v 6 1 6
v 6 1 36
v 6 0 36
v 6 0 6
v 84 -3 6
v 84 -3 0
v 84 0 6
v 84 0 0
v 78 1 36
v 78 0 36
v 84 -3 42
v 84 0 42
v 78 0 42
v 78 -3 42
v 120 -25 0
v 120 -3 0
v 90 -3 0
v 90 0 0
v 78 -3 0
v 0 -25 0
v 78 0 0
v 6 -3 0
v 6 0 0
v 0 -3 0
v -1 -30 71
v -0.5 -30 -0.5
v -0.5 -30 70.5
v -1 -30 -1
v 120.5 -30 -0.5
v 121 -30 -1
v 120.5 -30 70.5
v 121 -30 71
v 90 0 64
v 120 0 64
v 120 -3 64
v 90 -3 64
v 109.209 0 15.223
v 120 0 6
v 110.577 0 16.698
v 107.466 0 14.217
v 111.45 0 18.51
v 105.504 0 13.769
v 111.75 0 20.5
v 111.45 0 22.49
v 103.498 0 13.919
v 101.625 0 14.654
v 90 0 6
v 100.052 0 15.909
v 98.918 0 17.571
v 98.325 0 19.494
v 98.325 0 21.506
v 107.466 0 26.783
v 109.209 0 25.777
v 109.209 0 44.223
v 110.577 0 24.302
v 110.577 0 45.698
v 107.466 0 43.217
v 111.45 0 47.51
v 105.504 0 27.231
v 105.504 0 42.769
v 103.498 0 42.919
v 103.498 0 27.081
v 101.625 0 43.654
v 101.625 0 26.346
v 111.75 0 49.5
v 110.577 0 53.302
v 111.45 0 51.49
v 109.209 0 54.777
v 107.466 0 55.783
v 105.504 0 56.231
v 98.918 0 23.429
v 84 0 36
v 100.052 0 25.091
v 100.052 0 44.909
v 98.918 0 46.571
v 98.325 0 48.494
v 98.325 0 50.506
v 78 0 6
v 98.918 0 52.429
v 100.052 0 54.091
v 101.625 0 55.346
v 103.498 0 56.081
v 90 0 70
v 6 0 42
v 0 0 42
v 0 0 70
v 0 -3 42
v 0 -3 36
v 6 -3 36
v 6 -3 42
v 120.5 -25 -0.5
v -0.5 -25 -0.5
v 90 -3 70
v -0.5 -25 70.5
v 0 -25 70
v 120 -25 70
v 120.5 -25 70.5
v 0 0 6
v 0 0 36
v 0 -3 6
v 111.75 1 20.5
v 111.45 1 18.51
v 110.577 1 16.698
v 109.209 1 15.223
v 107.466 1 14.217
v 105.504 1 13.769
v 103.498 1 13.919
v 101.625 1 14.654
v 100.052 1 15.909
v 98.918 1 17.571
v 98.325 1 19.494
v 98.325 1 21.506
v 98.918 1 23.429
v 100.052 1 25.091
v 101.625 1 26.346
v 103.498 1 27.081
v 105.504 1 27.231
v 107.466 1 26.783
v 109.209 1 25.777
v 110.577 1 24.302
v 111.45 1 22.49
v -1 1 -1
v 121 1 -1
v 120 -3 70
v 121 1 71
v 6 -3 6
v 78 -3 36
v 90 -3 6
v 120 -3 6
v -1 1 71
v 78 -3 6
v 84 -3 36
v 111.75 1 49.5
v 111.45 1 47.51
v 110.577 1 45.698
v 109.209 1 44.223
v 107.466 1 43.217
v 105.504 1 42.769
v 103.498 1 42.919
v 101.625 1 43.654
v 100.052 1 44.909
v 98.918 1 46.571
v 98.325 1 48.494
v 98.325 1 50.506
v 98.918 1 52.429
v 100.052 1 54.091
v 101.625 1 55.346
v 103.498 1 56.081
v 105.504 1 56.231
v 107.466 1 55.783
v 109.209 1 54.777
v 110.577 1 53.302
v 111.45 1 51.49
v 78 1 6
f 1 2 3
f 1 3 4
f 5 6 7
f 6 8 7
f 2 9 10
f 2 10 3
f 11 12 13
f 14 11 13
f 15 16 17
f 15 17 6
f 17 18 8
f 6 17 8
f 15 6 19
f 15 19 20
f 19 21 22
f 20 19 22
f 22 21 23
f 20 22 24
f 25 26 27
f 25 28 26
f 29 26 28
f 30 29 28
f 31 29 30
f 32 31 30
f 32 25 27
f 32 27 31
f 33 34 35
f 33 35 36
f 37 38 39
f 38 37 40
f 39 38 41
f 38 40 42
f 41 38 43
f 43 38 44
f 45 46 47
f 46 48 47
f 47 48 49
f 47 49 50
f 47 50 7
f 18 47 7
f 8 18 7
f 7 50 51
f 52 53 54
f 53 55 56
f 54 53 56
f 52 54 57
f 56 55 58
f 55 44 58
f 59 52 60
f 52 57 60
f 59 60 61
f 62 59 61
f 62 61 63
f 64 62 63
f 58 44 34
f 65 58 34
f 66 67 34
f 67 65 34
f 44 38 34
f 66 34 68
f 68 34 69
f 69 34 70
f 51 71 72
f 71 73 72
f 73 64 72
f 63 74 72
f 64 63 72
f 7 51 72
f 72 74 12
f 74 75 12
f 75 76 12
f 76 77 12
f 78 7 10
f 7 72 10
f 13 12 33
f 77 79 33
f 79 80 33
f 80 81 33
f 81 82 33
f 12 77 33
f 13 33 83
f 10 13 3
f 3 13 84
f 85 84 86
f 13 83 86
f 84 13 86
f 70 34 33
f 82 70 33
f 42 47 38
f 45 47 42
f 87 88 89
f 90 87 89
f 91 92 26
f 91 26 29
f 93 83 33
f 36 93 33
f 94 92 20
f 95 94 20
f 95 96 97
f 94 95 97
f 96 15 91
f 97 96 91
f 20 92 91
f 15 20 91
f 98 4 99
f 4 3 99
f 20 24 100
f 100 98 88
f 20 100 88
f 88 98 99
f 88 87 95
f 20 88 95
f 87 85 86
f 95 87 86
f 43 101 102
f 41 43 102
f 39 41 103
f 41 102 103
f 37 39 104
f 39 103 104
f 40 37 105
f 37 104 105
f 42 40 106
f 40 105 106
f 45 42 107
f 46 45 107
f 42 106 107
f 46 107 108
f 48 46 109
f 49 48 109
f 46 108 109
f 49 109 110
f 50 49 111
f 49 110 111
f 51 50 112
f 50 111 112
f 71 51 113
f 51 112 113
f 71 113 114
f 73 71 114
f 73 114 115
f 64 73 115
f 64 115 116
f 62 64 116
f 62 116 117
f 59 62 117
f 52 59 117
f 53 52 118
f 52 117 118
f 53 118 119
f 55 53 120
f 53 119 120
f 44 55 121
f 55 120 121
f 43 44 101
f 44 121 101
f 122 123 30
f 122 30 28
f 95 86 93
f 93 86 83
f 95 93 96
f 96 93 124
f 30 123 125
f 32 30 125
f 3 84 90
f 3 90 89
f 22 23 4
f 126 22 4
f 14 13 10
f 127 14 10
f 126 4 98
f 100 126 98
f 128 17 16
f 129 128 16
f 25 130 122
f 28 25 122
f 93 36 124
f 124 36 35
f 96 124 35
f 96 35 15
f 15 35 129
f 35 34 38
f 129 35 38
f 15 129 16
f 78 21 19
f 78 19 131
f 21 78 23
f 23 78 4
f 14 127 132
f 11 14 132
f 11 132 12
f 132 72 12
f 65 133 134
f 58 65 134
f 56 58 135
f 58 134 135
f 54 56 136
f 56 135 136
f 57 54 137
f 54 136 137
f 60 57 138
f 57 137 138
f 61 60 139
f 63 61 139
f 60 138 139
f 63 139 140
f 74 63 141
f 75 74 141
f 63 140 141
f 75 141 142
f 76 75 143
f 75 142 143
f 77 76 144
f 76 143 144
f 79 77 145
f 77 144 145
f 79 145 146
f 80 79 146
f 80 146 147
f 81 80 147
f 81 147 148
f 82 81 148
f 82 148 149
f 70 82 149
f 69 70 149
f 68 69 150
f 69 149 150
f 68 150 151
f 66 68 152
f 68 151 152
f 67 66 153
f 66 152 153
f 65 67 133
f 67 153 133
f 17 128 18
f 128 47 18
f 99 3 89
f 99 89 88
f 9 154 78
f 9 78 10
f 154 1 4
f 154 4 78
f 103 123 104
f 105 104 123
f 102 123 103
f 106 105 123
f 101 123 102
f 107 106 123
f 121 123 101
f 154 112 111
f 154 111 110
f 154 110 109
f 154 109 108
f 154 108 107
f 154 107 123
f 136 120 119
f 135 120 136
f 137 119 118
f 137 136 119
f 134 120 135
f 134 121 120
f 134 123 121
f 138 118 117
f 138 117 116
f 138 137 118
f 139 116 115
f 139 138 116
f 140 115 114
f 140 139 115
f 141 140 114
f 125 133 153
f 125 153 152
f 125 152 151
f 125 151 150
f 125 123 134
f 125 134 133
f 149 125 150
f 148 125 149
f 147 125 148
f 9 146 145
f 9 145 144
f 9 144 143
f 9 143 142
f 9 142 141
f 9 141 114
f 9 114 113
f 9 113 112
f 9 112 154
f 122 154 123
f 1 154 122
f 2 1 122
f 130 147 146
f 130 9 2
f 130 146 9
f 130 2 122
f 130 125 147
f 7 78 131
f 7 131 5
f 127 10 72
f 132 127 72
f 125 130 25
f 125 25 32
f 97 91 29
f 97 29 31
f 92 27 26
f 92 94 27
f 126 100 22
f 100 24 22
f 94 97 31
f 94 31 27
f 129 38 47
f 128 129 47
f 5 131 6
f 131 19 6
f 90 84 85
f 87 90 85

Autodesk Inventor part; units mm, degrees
ref_plane "YZ Plane" through (0, 0, 0) normal (1, 0, 0) x (0, 1, 0)
ref_plane "XZ Plane" through (0, 0, 0) normal (0, 1, 0) x (-1, 0, 0)
ref_plane "XY Plane" through (0, 0, 0) normal (0, 0, 1) x (1, 0, 0)
sketch "Sketch1" plane through (0, 0, 0) normal (0, 1, 0) x (-1, 0, 0)
  line L0 (0, 0) -> (-120, 0)
  line L1 (-120, 0) -> (-120, 70)
  line L2 (-120, 70) -> (0, 70)
  line L3 (0, 70) -> (0, 0)
  dimension "d0" = 120
  dimension "d1" = 70
extrude "Extrusion1" add sketch "Sketch1" along normal blind 1
sketch "Sketch2" plane through (0, 1, 0) normal (0, 1, 0) x (1, 0, 0)
  line L0 (120, -70) -> (120, 0) projected
  line L1 (120, 0) -> (0, 0) projected
  line L2 (120, -70) -> (90, -70)
  line L3 (90, -70) -> (90, 0)
  line L4 (90, 0) -> (120, 0)
  line L5 (120, 0) -> (120, -70)
  line L6 (0, 0) -> (0, -70) projected
  line L7 (0, -70) -> (90, -70)
  line L8 (90, -70) -> (90, -11)
  line L9 (90, -11) -> (0, -11)
  line L10 (0, -11) -> (0, -70)
  line L11 (0, 0) -> (84, 0)
  line L12 (84, 0) -> (84, -42)
  line L13 (84, -42) -> (0, -42)
  line L14 (0, -42) -> (0, 0)
  line L15 (0, 0) -> (6, 0)
  line L16 (6, 0) -> (6, -6)
  line L17 (6, -6) -> (0, -6)
  line L18 (0, -6) -> (0, 0)
  line L19 (84, 0) -> (78, 0)
  line L20 (78, 0) -> (78, -6)
  line L21 (78, -6) -> (84, -6)
  line L22 (84, -6) -> (84, 0)
  line L23 (90, 0) -> (120, 0)
  line L24 (120, 0) -> (120, -6)
  line L25 (120, -6) -> (90, -6)
  line L26 (90, -6) -> (90, 0)
  line L27 (0, -42) -> (6, -42)
  line L28 (6, -42) -> (6, -36)
  line L29 (6, -36) -> (0, -36)
  line L30 (0, -36) -> (0, -42)
  line L31 (84, -42) -> (78, -42)
  line L32 (78, -42) -> (78, -36)
  line L33 (78, -36) -> (84, -36)
  line L34 (84, -36) -> (84, -42)
  line L35 (90, -70) -> (120, -70)
  line L36 (120, -70) -> (120, -64)
  line L37 (120, -64) -> (90, -64)
  line L38 (90, -64) -> (90, -70)
  line L39 (6, -6) -> (78, -6)
  line L40 (78, -6) -> (78, -36)
  line L41 (78, -36) -> (6, -36)
  line L42 (6, -36) -> (6, -6)
  line L43 (90, 0) -> (105, 0)
  line L44 (105, 0) -> (105, -20.5)
  line L45 (105, -20.5) -> (90, -20.5)
  line L46 (90, -20.5) -> (90, 0)
  circle A0 centre (105, -20.5) radius 6.75
  line L47 (90, -70) -> (105, -70)
  line L48 (105, -70) -> (105, -49.5)
  line L49 (105, -49.5) -> (90, -49.5)
  line L50 (90, -49.5) -> (90, -70)
  circle A1 centre (105, -49.5) radius 6.75
  point P0 (90, -64)
  point P1 (90, -6)
  point P2 (120, -6)
  point P3 (78, 0)
  point P4 (0, -36)
  point P5 (0, -42)
  point P6 (6, -11)
  point P7 (6, -36)
  point P8 (79, -29)
  point P9 (78, -11)
  dimension "d4" = 30
  dimension "d5" = 59
  dimension "d6" = 84
  dimension "d7" = 42
  dimension "d8" = 6
  dimension "d9" = 6
  dimension "d10" = 6
  dimension "d11" = 6
  dimension "d12" = 6
  dimension "d13" = 6
  dimension "d14" = 30
  dimension "d15" = 15
  dimension "d16" = 20.5
  dimension "d17" = 13.5
  dimension "d18" = 15
  dimension "d19" = 20.5
  dimension "d20" = 13.5
extrude "Extrusion2" cut sketch "Sketch2" against normal blind 1 contours A1 L49 L48 | L48 L49 A1 | A0 L45 L44 | L44 L45 A0
extrude "Extrusion3" add sketch "Sketch2" against normal blind 4 contours L2 L48 L37 L0 | L2 L3 L37 L48 | L25 L44 L1 L0 | L25 L3 L1 L44 | L6 L29 L28 L13 | L12 L21 L20 L1 | L32 L33 L12 L13 | L6 L1 L16 L17
extrude "Extrusion4" cut sketch "Sketch2" against normal blind 4 contours L42 L9 L40 L41 | L9 L42 L39 L40
sketch "Sketch5" plane through (0, 1, 0) normal (0, 1, 0) x (1, 0, 0)
  line L0 (0, 0) -> (0, -70) projected
  line L1 (0, 0) -> (-1, 0)
  line L2 (-1, 0) -> (-1, 1)
  line L3 (-1, 1) -> (0, 1)
  line L4 (0, 1) -> (0, 0)
  line L5 (0, -70) -> (-1, -70)
  line L6 (-1, -70) -> (-1, -71)
  line L7 (-1, -71) -> (0, -71)
  line L8 (0, -71) -> (0, -70)
  line L9 (0, -70) -> (120, -70) projected
  line L10 (120, -70) -> (121, -70)
  line L11 (121, -70) -> (121, -71)
  line L12 (121, -71) -> (120, -71)
  line L13 (120, -71) -> (120, -70)
  line L14 (120, -70) -> (120, 0) projected
  line L15 (120, 0) -> (121, 0)
  line L16 (121, 0) -> (121, 1)
  line L17 (121, 1) -> (120, 1)
  line L18 (120, 1) -> (120, 0)
  line L19 (120, 0) -> (0, 0) projected
  line L20 (120, 1) -> (0, 1)
  line L21 (0, 1) -> (0, 0)
  line L22 (0, 0) -> (120, 0)
  line L23 (120, 0) -> (120, 1)
  line L24 (-1, 0) -> (0, 0)
  line L25 (0, 0) -> (0, -70)
  line L26 (0, -70) -> (-1, -70)
  line L27 (-1, -70) -> (-1, 0)
  line L28 (0, -71) -> (120, -71)
  line L29 (120, -71) -> (120, -70)
  line L30 (120, -70) -> (0, -70)
  line L31 (0, -70) -> (0, -71)
  line L32 (121, -70) -> (120, -70)
  line L33 (120, -70) -> (120, 0)
  line L34 (120, 0) -> (121, 0)
  line L35 (121, 0) -> (121, -70)
  dimension "d36" = 1
  dimension "d37" = 1
  dimension "d38" = 1
  dimension "d39" = 1
  dimension "d40" = 1
  dimension "d41" = 1
  dimension "d42" = 1
  dimension "d43" = 1
extrude "Extrusion5" add sketch "Sketch5" against normal blind 26 contours L0 L5 L27 L1 | L1 L2 L3 L4 | L4 L20 L18 L19 | L8 L7 L6 L5 | L9 L13 L28 L8 | L15 L35 L10 L14 | L18 L17 L16 L15 | L10 L11 L12 L13
sketch "Sketch6" plane through (0, -25, 0) normal (0, -1, 0) x (1, 0, 0)
  line L0 (121, 71) -> (-1, 71) projected
  line L1 (0, 70) -> (120, 70) projected
  line L2 (121, 71) -> (120, 70)
  line L3 (120, 0) -> (0, 0) projected
  line L4 (0, 0) -> (-1, -1)
  line L5 (-0.5, -0.5) -> (120.5, -0.5)
  line L6 (120.5, -0.5) -> (120.5, 70.5)
  line L7 (120.5, 70.5) -> (-0.5, 70.5)
  line L8 (-0.5, 70.5) -> (-0.5, -0.5)
  line L9 (121, -1) -> (-1, -1) projected
  line L10 (121, 71) -> (-1, 71)
  line L11 (-1, 71) -> (-1, -1)
  line L12 (-1, -1) -> (121, -1)
  line L13 (121, -1) -> (121, 71)
  point P0 (121, -1)
sketch "Sketch7" plane through (0, 1, 0) normal (0, 1, 0) x (1, 0, 0)
  point P0 (0, 0)
extrude "Extrusion6" add sketch "Sketch6" along normal blind 5 contours L2 L7 L8 L4 L11 L0 | L13 L9 L4 L5 L6 L2
properties part number "carcassa"
